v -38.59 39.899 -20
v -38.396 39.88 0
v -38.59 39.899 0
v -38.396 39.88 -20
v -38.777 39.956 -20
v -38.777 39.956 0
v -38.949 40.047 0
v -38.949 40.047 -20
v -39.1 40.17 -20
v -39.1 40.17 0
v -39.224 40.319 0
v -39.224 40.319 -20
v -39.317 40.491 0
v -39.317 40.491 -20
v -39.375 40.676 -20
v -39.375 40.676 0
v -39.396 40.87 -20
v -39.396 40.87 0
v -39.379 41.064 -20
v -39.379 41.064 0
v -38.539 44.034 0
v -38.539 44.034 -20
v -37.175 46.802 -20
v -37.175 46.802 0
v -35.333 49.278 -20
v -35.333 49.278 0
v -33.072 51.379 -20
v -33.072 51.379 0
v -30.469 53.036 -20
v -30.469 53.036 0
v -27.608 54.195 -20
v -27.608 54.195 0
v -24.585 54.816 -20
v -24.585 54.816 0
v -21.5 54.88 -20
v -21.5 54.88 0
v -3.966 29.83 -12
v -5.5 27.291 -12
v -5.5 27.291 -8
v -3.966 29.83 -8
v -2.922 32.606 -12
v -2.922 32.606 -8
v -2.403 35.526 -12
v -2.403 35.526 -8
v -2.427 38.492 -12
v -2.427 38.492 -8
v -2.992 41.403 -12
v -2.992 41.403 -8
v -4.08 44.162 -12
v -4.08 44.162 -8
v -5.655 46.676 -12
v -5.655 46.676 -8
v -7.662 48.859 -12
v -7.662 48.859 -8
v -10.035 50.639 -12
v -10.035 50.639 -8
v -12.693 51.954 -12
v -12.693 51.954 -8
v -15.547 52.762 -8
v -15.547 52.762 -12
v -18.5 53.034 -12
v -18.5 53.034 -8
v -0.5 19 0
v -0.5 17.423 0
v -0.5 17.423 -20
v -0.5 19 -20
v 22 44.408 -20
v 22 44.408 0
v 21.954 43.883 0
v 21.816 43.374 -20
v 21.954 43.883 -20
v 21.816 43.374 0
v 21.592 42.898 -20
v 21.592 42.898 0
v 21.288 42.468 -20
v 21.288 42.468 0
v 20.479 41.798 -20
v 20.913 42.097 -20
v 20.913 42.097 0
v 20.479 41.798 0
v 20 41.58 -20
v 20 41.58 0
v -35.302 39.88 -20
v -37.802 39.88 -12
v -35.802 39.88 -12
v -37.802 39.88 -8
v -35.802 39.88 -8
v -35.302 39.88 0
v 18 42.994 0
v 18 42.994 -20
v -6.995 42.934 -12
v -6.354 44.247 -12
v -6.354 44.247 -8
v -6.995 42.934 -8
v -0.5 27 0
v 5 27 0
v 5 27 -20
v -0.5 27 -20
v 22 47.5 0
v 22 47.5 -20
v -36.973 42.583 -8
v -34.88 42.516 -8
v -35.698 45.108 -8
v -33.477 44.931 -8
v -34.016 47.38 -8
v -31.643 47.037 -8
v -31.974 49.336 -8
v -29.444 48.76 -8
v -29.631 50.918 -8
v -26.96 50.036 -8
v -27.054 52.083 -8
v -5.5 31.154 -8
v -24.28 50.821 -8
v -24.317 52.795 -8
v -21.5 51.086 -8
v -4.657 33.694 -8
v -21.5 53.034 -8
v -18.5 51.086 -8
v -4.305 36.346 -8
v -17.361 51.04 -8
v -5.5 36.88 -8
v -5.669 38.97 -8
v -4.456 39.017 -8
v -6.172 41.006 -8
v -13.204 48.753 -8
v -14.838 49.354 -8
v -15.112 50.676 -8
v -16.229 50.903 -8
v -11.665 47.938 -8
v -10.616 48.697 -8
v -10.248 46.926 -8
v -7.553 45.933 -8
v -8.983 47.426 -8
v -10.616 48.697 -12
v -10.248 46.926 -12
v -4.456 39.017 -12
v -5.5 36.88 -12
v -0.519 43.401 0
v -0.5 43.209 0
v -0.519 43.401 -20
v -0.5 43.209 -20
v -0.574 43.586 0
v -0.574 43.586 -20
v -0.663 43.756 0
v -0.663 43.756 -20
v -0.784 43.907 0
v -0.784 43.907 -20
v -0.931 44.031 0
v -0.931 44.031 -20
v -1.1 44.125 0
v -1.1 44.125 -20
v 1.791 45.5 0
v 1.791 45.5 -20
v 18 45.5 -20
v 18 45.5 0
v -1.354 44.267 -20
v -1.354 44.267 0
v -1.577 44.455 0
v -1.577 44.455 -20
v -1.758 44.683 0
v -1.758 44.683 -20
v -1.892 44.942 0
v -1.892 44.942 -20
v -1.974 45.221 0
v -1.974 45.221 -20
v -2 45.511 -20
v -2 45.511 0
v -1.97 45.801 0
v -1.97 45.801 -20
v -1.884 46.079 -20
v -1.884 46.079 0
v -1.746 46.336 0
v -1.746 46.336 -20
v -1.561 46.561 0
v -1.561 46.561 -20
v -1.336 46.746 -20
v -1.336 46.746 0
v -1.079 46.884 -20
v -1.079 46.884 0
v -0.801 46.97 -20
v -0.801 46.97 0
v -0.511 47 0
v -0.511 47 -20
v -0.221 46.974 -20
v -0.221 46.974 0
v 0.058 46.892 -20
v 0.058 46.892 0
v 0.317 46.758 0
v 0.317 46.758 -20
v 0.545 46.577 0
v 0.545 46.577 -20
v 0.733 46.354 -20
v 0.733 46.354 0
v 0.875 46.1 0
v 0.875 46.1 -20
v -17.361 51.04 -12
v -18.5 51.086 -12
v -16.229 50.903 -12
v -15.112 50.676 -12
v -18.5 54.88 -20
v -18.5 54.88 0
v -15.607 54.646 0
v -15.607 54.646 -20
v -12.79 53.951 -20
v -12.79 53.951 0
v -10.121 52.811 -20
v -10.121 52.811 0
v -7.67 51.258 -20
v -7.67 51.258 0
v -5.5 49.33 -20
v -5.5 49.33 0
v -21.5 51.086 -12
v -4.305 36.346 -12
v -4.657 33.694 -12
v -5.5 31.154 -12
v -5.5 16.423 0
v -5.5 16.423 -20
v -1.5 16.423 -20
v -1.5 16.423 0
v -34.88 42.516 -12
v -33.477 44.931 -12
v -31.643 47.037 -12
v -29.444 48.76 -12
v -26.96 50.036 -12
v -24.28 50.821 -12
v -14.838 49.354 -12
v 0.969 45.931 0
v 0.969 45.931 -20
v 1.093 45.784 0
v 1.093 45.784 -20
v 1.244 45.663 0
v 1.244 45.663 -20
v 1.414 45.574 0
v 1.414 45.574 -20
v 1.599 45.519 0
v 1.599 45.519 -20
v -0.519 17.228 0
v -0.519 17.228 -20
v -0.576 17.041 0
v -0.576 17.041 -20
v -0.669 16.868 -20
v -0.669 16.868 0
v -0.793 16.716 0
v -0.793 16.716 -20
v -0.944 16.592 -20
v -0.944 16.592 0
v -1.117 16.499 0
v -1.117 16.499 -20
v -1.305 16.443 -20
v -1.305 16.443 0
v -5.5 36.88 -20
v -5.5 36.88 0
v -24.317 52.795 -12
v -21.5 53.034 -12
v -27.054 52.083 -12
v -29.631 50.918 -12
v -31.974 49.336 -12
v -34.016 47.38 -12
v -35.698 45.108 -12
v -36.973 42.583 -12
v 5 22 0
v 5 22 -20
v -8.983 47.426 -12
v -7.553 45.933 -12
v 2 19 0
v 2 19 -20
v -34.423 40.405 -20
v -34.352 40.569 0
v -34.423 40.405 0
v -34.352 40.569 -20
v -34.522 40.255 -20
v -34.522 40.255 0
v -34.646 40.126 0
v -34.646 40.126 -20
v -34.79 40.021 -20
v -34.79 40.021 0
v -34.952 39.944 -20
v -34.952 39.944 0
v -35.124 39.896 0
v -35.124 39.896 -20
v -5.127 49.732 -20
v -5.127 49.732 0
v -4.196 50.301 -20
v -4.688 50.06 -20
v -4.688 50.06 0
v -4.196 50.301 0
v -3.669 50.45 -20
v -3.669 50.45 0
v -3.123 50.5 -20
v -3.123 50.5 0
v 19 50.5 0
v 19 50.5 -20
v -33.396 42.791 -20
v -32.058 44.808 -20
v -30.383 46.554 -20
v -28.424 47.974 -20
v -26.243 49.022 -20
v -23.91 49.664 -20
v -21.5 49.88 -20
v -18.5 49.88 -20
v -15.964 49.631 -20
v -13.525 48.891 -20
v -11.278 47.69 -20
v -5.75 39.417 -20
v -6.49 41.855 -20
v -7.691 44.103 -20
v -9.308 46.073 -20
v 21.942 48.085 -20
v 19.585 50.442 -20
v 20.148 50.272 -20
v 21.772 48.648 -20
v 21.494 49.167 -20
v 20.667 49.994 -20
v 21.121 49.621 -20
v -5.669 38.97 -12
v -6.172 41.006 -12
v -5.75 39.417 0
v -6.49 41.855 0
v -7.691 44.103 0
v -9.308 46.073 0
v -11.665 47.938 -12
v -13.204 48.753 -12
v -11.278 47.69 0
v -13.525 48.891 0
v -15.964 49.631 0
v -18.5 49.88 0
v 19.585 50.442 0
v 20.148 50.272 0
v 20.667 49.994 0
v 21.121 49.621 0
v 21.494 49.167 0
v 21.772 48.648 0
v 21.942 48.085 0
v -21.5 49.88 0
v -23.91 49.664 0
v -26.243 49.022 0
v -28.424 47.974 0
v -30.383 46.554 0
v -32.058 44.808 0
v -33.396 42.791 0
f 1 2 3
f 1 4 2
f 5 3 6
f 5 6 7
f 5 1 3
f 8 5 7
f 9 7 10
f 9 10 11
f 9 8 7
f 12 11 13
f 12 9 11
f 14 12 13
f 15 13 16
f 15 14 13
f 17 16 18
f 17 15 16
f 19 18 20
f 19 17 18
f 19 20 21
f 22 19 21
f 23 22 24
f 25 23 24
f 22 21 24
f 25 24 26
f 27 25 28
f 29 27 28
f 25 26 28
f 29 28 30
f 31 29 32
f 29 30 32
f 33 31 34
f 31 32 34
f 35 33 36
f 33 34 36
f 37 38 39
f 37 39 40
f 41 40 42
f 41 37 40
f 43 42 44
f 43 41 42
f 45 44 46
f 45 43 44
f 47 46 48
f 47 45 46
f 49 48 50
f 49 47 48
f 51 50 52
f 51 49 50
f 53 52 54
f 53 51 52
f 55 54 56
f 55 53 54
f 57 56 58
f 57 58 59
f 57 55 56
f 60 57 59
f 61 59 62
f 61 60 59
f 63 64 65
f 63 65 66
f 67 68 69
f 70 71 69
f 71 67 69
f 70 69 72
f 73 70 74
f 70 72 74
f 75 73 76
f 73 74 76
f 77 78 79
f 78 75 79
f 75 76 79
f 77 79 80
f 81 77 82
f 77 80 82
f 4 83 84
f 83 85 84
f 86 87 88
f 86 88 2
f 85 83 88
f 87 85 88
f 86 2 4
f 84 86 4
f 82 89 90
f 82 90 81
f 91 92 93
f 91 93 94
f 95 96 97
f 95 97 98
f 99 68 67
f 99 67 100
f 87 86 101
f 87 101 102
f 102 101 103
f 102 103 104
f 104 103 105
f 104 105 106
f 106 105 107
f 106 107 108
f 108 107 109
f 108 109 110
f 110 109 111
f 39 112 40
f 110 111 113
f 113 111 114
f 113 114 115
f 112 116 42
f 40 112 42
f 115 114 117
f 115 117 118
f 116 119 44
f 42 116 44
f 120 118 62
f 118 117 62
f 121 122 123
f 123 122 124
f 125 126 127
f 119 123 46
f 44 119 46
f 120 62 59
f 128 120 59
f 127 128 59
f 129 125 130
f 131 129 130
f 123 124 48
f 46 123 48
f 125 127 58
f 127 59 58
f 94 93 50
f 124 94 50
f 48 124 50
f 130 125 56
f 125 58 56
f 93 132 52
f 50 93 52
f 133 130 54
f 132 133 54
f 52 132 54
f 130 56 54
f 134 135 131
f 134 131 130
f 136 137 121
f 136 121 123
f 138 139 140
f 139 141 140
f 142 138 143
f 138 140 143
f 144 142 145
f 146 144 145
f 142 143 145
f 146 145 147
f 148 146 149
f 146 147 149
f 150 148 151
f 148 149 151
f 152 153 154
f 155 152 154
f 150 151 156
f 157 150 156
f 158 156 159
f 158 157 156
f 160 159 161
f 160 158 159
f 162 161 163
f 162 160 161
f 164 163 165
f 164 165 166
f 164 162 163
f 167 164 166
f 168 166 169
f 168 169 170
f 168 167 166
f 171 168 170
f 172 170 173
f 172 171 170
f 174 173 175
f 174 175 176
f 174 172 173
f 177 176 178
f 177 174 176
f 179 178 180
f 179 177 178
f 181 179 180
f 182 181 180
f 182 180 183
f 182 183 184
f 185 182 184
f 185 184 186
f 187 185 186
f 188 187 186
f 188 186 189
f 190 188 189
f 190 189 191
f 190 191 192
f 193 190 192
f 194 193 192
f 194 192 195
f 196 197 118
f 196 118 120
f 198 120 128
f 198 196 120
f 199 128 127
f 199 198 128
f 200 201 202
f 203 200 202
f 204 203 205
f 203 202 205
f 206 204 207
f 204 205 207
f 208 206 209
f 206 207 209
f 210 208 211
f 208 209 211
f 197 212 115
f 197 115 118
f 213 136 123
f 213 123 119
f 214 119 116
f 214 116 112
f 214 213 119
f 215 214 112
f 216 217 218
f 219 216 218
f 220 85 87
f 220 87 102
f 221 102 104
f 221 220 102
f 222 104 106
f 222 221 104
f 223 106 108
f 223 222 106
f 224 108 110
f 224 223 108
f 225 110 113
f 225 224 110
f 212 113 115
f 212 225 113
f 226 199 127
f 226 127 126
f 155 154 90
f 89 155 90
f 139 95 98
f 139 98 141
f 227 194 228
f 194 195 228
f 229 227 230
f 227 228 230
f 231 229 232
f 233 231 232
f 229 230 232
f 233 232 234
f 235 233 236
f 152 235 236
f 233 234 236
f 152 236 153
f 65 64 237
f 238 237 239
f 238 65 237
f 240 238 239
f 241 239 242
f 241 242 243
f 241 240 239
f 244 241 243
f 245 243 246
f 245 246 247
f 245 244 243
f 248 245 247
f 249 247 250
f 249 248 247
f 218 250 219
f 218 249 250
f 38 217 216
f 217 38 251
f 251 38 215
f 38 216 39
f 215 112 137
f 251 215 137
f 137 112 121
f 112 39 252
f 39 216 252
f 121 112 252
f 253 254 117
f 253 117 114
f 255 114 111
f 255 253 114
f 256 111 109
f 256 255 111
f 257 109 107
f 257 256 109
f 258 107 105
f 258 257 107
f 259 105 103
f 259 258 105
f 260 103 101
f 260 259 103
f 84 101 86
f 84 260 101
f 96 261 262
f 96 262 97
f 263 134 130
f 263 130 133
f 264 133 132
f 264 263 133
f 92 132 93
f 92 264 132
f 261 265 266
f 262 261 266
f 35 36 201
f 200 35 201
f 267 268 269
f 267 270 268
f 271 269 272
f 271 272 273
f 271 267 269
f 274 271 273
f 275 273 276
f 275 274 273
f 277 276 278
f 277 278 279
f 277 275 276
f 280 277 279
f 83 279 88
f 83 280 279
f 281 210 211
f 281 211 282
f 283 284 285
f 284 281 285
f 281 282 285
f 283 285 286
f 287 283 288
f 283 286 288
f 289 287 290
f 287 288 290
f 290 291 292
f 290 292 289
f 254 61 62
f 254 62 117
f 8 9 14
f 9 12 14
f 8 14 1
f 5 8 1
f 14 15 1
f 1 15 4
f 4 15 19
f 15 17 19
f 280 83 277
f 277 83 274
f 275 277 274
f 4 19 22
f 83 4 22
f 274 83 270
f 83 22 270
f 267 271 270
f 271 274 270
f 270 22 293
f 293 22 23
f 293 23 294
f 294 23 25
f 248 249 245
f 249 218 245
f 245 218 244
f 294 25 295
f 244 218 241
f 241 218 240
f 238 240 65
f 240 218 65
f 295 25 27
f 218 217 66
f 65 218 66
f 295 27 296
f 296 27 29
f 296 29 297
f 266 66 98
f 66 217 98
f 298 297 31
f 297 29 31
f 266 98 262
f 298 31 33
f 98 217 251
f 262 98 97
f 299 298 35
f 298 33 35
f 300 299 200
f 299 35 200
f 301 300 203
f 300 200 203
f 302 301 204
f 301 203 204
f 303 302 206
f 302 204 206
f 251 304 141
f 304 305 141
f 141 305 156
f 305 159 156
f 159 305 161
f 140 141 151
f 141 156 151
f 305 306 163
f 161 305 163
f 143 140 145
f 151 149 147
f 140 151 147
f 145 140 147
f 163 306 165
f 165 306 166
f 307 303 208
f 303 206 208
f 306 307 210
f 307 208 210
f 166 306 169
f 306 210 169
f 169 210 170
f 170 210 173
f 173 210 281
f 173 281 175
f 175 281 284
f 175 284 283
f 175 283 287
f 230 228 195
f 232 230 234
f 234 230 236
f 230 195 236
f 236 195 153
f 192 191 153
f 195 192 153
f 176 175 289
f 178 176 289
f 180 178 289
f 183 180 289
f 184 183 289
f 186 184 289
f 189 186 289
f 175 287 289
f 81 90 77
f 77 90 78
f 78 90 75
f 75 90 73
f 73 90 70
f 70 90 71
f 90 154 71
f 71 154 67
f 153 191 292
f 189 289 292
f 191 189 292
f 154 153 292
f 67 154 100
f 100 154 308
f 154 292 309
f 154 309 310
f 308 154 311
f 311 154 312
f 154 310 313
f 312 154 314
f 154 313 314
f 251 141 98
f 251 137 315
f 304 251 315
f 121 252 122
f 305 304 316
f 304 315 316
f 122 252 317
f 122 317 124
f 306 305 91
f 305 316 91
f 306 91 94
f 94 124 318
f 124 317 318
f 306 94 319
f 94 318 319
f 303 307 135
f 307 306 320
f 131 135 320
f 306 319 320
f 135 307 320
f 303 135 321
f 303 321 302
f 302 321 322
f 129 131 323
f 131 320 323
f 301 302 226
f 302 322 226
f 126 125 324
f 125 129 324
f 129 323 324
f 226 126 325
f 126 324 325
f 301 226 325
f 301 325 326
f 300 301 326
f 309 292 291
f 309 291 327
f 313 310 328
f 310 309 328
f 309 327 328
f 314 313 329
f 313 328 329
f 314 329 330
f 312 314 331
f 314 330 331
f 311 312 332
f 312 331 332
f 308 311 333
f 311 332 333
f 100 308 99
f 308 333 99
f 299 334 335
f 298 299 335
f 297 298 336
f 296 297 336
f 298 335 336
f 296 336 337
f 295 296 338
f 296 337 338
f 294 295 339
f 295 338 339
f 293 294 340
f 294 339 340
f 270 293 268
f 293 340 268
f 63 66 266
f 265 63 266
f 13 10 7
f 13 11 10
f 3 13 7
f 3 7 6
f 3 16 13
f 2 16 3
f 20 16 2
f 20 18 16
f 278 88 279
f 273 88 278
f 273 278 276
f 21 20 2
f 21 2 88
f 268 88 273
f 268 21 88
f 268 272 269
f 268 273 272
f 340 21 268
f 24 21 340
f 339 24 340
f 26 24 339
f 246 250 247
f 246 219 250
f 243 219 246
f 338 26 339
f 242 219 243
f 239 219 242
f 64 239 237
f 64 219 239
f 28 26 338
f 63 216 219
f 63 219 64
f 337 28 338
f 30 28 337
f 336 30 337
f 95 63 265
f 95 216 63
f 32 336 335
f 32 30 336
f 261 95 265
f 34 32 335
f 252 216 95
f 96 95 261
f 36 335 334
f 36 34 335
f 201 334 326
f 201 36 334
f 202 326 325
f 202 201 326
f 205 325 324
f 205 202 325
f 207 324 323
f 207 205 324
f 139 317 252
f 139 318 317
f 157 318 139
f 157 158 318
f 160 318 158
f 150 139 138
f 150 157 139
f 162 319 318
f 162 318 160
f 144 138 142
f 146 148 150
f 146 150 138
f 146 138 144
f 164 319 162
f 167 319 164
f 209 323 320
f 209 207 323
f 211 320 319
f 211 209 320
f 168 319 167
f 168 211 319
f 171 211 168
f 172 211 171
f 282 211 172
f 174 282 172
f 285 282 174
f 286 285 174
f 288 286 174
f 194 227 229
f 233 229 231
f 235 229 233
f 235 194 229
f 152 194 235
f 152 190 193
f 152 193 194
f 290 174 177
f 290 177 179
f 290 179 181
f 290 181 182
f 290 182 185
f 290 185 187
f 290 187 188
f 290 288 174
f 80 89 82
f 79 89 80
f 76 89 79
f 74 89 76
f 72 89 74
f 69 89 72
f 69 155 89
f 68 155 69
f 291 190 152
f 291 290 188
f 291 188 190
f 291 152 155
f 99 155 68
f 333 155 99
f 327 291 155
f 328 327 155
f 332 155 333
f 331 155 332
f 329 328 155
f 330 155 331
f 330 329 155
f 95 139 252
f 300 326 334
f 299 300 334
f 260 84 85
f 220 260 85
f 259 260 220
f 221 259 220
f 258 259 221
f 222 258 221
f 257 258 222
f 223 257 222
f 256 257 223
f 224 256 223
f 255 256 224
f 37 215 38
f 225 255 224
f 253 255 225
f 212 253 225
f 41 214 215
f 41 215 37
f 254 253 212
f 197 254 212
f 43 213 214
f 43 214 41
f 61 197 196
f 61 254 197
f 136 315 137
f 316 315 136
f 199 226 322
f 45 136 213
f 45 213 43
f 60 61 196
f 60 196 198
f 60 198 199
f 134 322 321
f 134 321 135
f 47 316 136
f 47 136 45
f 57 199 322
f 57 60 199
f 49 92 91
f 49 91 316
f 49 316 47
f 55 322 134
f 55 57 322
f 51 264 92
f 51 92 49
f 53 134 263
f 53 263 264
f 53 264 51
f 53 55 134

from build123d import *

# Parameters (mm, degrees)
BOSS_EXTRUDE1_DEPTH     = 20
BOSS_EXTRUDE2_DEPTH     = 20
FILLET1_R               = 3
CHAMFER1_SIZE           = 3
FILLET2_R               = 1
CUT_EXTRUDE1_DEPTH      = 71.578127074
CUT_EXTRUDE2_DEPTH      = 2
CUT_EXTRUDE2_DEPTH_BACK = 2
CUT_EXTRUDE2_START      = -10
CHAMFER2_START          = 44.201779004
CHAMFER2_OUTLINE_W      = 6
CHAMFER2_OUTLINE_H      = 20
CHAMFER2_DEPTH          = 1.294789205


with BuildPart() as part:
    # Sketch1 → Boss-Extrude1 (new body)
    with BuildSketch(Plane.XY):
        with BuildLine():
            Line((18, 45.5), (18, 41.407980081))
            Line((18, 41.407980081), (22, 41.407980081))
            Line((22, 41.407980081), (22, 50.5))
            Line((22, 50.5), (-5.5, 50.5))
            Line((-5.5, 50.5), (-5.5, 28.873187411))
            Line((-5.5, 28.873187411), (-5.5, 16.423287813))
            Line((-5.5, 16.423287813), (-0.5, 16.423287813))
            Line((-0.5, 16.423287813), (-0.5, 19))
            Line((-0.5, 19), (5, 19))
            Line((5, 19), (5, 27))
            Line((5, 27), (-0.5, 27))
            Line((-0.5, 27), (-0.5, 44))
            ThreePointArc((-0.5, 44), (-1.560660172, 46.560660172), (1, 45.5))
            Line((1, 45.5), (18, 45.5))
        make_face()
        with BuildLine():
            Line((-5.5, 16.423287813), (-5.5, 28.873187411))
            ThreePointArc((-5.5, 28.873187411), (-9.307611845, 19.680799255), (-18.5, 15.873187411))
            Line((-18.5, 15.873187411), (-21.5, 15.873187411))
            ThreePointArc((-21.5, 15.873187411), (-29.723519433, 18.660367749), (-34.557759664, 25.873187411))
            Line((-34.557759664, 25.873187411), (-39.557759664, 25.873187411))
            ThreePointArc((-39.557759664, 25.873187411), (-33.539294452, 14.749097831), (-21.5, 10.873187411))
            Line((-21.5, 10.873187411), (-18.5, 10.873187411))
            ThreePointArc((-18.5, 10.873187411), (-11.432404679, 12.31875911), (-5.5, 16.423287813))
        make_face()
    extrude(amount=-BOSS_EXTRUDE1_DEPTH)

    # Sketch4 → Boss-Extrude2 (add)
    with BuildSketch(Plane.XY):
        with BuildLine():
            Line((-5.5, 49.330303976), (-5.5, 36.880404378))
            ThreePointArc((-5.5, 36.880404378), (-9.307611845, 46.072792533), (-18.5, 49.880404378))
            Line((-18.5, 49.880404378), (-21.5, 49.880404378))
            ThreePointArc((-21.5, 49.880404378), (-29.723519433, 47.09322404), (-34.557759664, 39.880404378))
            Line((-34.557759664, 39.880404378), (-39.557759664, 39.880404378))
            ThreePointArc((-39.557759664, 39.880404378), (-33.539294452, 51.004493958), (-21.5, 54.880404378))
            Line((-21.5, 54.880404378), (-18.5, 54.880404378))
            ThreePointArc((-18.5, 54.880404378), (-11.432404679, 53.434832679), (-5.5, 49.330303976))
        make_face()
    extrude(amount=-BOSS_EXTRUDE2_DEPTH)

    # Fillet1
    # the kernel refuses this fillet: 3 mm, written as the material it takes off along each edge
    with BuildSketch(Plane(origin=(22, 41.407980081, 7.5), x_dir=(-1, 0, 0), z_dir=(0, 0, -1)), Plane(origin=(22, 50.5, 7.5), x_dir=(0, -1, 0), z_dir=(0, 0, -1))) as fillet1_piece_1:
        with BuildLine():
            CenterArc((FILLET1_R, FILLET1_R), FILLET1_R, 180, 90)
            Line((0, FILLET1_R), (-FILLET1_R * 0.02, FILLET1_R))
            Line((-FILLET1_R * 0.02, FILLET1_R), (-FILLET1_R * 0.02, -FILLET1_R * 0.02))
            Line((-FILLET1_R * 0.02, -FILLET1_R * 0.02), (FILLET1_R, -FILLET1_R * 0.02))
            Line((FILLET1_R, -FILLET1_R * 0.02), (FILLET1_R, 0))
        make_face()
    extrude(amount=35, mode=Mode.SUBTRACT)
    with BuildSketch(Plane(origin=(-5.5, 50.5, 5.942425513), x_dir=(1, 0, 0), z_dir=(0, 0, -1))) as fillet1_piece_2_section:
        with BuildLine():
            CenterArc((2.376970205, 3), FILLET1_R, 217.596829801, 52.403170199)
            Line((0, 1.169696024), (-0.047539404, 1.133089945))
            ThreePointArc((-0.047539404, 1.133089945), (-0.06, 0.584848012), (-0.06, 0))
            Line((-0.06, 0), (0, -0.06))
            Line((0, -0.06), (2.376970205, -0.06))
            Line((2.376970205, -0.06), (2.376970205, 0))
        make_face()
    fillet1_piece_2 = extrude(amount=31.884851026, mode=Mode.PRIVATE)
    fillet1_piece_2 = fillet1_piece_2 - Plane(origin=(-18.5, 36.880404378, 5.942425513), x_dir=(0, 1, 0), z_dir=(0, 0, 1)) * Cylinder(18, 74, mode=Mode.PRIVATE)
    add(fillet1_piece_2, mode=Mode.SUBTRACT)

    # Chamfer1
    chamfer1_edges = [part.edges().sort_by_distance(p)[0] for p in [
        (5, 19, -10),
    ]]
    chamfer(chamfer1_edges, length=CHAMFER1_SIZE)

    # Fillet2
    fillet2_edges = [part.edges().sort_by_distance(p)[0] for p in [
        (-0.5, 16.423287813, -10),
        (1, 45.5, -10),
        (-0.5, 44, -10),
        (-34.557759664, 39.880404378, -10),
        (-39.557759664, 39.880404378, -10),
    ]]
    fillet(fillet2_edges, radius=FILLET2_R)

    # Sketch1<3> → Cut-Extrude1 (cut, through all)
    with BuildSketch(Plane.XY):
        with BuildLine():
            Line((-34.557759664, 25.873187411), (-39.557759664, 25.873187411))
            ThreePointArc((-39.557759664, 25.873187411), (-33.539294452, 14.749097831), (-21.5, 10.873187411))
            Line((-21.5, 10.873187411), (-18.5, 10.873187411))
            ThreePointArc((-18.5, 10.873187411), (-11.432404679, 12.31875911), (-5.5, 16.423287813))
            Line((-5.5, 16.423287813), (-5.5, 28.873187411))
            ThreePointArc((-5.5, 28.873187411), (-9.307611845, 19.680799255), (-18.5, 15.873187411))
            Line((-18.5, 15.873187411), (-21.5, 15.873187411))
            ThreePointArc((-21.5, 15.873187411), (-29.723519433, 18.660367749), (-34.557759664, 25.873187411))
        make_face()
    extrude(amount=-CUT_EXTRUDE1_DEPTH, mode=Mode.SUBTRACT)

    # Sketch3 → Cut-Extrude2 (cut, two sides: drawn at the far end of the back side and taken through both)
    with BuildSketch(Plane.XY.offset(CUT_EXTRUDE2_START - CUT_EXTRUDE2_DEPTH_BACK)):
        with BuildLine():
            ThreePointArc((-10.615862632, 48.696779185), (-12.77767622, 49.881994518), (-15.111856664, 50.675578184))
            Line((-15.111856664, 50.675578184), (-14.837502866, 49.3538207))
            ThreePointArc((-14.837502866, 49.3538207), (-12.420426421, 48.371217451), (-10.248251304, 46.925733813))
            Line((-10.248251304, 46.925733813), (-10.615862632, 48.696779185))
        make_face()
        with BuildLine():
            ThreePointArc((-4.45647435, 39.017159612), (-5.14675526, 41.725731045), (-6.354052632, 44.246699113))
            Line((-6.354052632, 44.246699113), (-6.995300859, 42.933659509))
            ThreePointArc((-6.995300859, 42.933659509), (-5.87936038, 39.99800852), (-5.5, 36.880404378))
            Line((-5.5, 36.880404378), (-4.45647435, 39.017159612))
        make_face()
        with BuildLine():
            ThreePointArc((-21.5, 53.034307539), (-31.973681851, 49.335761876), (-37.80235804, 39.880404378))
            Line((-37.80235804, 39.880404378), (-35.80235804, 39.880404378))
            ThreePointArc((-35.80235804, 39.880404378), (-30.584504262, 47.950694244), (-21.5, 51.085556106))
            Line((-21.5, 51.085556106), (-18.5, 51.085556106))
            ThreePointArc((-18.5, 51.085556106), (-16.793571188, 50.982689168), (-15.111856664, 50.675578184))
            ThreePointArc((-15.111856664, 50.675578184), (-12.77767622, 49.881994518), (-10.615862632, 48.696779185))
            ThreePointArc((-10.615862632, 48.696779185), (-8.240766267, 46.705599481), (-6.354052632, 44.246699113))
            ThreePointArc((-6.354052632, 44.246699113), (-5.14675526, 41.725731045), (-4.45647435, 39.017159612))
            ThreePointArc((-4.45647435, 39.017159612), (-4.418325892, 35.011503653), (-5.5, 31.15446903))
            Line((-5.5, 31.15446903), (-5.5, 28.873187411))
            Line((-5.5, 28.873187411), (-5.5, 27.291421776))
            ThreePointArc((-5.5, 27.291421776), (-4.080428513, 44.162199863), (-18.5, 53.034307539))
            Line((-18.5, 53.034307539), (-21.5, 53.034307539))
        make_face()
    extrude(amount=CUT_EXTRUDE2_DEPTH + CUT_EXTRUDE2_DEPTH_BACK, mode=Mode.SUBTRACT)

    # Chamfer2: read off the stored shape, not the designer's step
    # Chamfer2 outline → Chamfer2 (cut)
    with BuildSketch(Plane(origin=(0, 0, 0), x_dir=(0.8164965809277286, -0.5773502691896223, 0), z_dir=(0.5773502691896223, 0.8164965809277285, 0)).offset(CHAMFER2_START)):
        with Locations((-9, 10)):
            Rectangle(CHAMFER2_OUTLINE_W, CHAMFER2_OUTLINE_H)
    extrude(amount=CHAMFER2_DEPTH, mode=Mode.SUBTRACT)


solid = part.part
